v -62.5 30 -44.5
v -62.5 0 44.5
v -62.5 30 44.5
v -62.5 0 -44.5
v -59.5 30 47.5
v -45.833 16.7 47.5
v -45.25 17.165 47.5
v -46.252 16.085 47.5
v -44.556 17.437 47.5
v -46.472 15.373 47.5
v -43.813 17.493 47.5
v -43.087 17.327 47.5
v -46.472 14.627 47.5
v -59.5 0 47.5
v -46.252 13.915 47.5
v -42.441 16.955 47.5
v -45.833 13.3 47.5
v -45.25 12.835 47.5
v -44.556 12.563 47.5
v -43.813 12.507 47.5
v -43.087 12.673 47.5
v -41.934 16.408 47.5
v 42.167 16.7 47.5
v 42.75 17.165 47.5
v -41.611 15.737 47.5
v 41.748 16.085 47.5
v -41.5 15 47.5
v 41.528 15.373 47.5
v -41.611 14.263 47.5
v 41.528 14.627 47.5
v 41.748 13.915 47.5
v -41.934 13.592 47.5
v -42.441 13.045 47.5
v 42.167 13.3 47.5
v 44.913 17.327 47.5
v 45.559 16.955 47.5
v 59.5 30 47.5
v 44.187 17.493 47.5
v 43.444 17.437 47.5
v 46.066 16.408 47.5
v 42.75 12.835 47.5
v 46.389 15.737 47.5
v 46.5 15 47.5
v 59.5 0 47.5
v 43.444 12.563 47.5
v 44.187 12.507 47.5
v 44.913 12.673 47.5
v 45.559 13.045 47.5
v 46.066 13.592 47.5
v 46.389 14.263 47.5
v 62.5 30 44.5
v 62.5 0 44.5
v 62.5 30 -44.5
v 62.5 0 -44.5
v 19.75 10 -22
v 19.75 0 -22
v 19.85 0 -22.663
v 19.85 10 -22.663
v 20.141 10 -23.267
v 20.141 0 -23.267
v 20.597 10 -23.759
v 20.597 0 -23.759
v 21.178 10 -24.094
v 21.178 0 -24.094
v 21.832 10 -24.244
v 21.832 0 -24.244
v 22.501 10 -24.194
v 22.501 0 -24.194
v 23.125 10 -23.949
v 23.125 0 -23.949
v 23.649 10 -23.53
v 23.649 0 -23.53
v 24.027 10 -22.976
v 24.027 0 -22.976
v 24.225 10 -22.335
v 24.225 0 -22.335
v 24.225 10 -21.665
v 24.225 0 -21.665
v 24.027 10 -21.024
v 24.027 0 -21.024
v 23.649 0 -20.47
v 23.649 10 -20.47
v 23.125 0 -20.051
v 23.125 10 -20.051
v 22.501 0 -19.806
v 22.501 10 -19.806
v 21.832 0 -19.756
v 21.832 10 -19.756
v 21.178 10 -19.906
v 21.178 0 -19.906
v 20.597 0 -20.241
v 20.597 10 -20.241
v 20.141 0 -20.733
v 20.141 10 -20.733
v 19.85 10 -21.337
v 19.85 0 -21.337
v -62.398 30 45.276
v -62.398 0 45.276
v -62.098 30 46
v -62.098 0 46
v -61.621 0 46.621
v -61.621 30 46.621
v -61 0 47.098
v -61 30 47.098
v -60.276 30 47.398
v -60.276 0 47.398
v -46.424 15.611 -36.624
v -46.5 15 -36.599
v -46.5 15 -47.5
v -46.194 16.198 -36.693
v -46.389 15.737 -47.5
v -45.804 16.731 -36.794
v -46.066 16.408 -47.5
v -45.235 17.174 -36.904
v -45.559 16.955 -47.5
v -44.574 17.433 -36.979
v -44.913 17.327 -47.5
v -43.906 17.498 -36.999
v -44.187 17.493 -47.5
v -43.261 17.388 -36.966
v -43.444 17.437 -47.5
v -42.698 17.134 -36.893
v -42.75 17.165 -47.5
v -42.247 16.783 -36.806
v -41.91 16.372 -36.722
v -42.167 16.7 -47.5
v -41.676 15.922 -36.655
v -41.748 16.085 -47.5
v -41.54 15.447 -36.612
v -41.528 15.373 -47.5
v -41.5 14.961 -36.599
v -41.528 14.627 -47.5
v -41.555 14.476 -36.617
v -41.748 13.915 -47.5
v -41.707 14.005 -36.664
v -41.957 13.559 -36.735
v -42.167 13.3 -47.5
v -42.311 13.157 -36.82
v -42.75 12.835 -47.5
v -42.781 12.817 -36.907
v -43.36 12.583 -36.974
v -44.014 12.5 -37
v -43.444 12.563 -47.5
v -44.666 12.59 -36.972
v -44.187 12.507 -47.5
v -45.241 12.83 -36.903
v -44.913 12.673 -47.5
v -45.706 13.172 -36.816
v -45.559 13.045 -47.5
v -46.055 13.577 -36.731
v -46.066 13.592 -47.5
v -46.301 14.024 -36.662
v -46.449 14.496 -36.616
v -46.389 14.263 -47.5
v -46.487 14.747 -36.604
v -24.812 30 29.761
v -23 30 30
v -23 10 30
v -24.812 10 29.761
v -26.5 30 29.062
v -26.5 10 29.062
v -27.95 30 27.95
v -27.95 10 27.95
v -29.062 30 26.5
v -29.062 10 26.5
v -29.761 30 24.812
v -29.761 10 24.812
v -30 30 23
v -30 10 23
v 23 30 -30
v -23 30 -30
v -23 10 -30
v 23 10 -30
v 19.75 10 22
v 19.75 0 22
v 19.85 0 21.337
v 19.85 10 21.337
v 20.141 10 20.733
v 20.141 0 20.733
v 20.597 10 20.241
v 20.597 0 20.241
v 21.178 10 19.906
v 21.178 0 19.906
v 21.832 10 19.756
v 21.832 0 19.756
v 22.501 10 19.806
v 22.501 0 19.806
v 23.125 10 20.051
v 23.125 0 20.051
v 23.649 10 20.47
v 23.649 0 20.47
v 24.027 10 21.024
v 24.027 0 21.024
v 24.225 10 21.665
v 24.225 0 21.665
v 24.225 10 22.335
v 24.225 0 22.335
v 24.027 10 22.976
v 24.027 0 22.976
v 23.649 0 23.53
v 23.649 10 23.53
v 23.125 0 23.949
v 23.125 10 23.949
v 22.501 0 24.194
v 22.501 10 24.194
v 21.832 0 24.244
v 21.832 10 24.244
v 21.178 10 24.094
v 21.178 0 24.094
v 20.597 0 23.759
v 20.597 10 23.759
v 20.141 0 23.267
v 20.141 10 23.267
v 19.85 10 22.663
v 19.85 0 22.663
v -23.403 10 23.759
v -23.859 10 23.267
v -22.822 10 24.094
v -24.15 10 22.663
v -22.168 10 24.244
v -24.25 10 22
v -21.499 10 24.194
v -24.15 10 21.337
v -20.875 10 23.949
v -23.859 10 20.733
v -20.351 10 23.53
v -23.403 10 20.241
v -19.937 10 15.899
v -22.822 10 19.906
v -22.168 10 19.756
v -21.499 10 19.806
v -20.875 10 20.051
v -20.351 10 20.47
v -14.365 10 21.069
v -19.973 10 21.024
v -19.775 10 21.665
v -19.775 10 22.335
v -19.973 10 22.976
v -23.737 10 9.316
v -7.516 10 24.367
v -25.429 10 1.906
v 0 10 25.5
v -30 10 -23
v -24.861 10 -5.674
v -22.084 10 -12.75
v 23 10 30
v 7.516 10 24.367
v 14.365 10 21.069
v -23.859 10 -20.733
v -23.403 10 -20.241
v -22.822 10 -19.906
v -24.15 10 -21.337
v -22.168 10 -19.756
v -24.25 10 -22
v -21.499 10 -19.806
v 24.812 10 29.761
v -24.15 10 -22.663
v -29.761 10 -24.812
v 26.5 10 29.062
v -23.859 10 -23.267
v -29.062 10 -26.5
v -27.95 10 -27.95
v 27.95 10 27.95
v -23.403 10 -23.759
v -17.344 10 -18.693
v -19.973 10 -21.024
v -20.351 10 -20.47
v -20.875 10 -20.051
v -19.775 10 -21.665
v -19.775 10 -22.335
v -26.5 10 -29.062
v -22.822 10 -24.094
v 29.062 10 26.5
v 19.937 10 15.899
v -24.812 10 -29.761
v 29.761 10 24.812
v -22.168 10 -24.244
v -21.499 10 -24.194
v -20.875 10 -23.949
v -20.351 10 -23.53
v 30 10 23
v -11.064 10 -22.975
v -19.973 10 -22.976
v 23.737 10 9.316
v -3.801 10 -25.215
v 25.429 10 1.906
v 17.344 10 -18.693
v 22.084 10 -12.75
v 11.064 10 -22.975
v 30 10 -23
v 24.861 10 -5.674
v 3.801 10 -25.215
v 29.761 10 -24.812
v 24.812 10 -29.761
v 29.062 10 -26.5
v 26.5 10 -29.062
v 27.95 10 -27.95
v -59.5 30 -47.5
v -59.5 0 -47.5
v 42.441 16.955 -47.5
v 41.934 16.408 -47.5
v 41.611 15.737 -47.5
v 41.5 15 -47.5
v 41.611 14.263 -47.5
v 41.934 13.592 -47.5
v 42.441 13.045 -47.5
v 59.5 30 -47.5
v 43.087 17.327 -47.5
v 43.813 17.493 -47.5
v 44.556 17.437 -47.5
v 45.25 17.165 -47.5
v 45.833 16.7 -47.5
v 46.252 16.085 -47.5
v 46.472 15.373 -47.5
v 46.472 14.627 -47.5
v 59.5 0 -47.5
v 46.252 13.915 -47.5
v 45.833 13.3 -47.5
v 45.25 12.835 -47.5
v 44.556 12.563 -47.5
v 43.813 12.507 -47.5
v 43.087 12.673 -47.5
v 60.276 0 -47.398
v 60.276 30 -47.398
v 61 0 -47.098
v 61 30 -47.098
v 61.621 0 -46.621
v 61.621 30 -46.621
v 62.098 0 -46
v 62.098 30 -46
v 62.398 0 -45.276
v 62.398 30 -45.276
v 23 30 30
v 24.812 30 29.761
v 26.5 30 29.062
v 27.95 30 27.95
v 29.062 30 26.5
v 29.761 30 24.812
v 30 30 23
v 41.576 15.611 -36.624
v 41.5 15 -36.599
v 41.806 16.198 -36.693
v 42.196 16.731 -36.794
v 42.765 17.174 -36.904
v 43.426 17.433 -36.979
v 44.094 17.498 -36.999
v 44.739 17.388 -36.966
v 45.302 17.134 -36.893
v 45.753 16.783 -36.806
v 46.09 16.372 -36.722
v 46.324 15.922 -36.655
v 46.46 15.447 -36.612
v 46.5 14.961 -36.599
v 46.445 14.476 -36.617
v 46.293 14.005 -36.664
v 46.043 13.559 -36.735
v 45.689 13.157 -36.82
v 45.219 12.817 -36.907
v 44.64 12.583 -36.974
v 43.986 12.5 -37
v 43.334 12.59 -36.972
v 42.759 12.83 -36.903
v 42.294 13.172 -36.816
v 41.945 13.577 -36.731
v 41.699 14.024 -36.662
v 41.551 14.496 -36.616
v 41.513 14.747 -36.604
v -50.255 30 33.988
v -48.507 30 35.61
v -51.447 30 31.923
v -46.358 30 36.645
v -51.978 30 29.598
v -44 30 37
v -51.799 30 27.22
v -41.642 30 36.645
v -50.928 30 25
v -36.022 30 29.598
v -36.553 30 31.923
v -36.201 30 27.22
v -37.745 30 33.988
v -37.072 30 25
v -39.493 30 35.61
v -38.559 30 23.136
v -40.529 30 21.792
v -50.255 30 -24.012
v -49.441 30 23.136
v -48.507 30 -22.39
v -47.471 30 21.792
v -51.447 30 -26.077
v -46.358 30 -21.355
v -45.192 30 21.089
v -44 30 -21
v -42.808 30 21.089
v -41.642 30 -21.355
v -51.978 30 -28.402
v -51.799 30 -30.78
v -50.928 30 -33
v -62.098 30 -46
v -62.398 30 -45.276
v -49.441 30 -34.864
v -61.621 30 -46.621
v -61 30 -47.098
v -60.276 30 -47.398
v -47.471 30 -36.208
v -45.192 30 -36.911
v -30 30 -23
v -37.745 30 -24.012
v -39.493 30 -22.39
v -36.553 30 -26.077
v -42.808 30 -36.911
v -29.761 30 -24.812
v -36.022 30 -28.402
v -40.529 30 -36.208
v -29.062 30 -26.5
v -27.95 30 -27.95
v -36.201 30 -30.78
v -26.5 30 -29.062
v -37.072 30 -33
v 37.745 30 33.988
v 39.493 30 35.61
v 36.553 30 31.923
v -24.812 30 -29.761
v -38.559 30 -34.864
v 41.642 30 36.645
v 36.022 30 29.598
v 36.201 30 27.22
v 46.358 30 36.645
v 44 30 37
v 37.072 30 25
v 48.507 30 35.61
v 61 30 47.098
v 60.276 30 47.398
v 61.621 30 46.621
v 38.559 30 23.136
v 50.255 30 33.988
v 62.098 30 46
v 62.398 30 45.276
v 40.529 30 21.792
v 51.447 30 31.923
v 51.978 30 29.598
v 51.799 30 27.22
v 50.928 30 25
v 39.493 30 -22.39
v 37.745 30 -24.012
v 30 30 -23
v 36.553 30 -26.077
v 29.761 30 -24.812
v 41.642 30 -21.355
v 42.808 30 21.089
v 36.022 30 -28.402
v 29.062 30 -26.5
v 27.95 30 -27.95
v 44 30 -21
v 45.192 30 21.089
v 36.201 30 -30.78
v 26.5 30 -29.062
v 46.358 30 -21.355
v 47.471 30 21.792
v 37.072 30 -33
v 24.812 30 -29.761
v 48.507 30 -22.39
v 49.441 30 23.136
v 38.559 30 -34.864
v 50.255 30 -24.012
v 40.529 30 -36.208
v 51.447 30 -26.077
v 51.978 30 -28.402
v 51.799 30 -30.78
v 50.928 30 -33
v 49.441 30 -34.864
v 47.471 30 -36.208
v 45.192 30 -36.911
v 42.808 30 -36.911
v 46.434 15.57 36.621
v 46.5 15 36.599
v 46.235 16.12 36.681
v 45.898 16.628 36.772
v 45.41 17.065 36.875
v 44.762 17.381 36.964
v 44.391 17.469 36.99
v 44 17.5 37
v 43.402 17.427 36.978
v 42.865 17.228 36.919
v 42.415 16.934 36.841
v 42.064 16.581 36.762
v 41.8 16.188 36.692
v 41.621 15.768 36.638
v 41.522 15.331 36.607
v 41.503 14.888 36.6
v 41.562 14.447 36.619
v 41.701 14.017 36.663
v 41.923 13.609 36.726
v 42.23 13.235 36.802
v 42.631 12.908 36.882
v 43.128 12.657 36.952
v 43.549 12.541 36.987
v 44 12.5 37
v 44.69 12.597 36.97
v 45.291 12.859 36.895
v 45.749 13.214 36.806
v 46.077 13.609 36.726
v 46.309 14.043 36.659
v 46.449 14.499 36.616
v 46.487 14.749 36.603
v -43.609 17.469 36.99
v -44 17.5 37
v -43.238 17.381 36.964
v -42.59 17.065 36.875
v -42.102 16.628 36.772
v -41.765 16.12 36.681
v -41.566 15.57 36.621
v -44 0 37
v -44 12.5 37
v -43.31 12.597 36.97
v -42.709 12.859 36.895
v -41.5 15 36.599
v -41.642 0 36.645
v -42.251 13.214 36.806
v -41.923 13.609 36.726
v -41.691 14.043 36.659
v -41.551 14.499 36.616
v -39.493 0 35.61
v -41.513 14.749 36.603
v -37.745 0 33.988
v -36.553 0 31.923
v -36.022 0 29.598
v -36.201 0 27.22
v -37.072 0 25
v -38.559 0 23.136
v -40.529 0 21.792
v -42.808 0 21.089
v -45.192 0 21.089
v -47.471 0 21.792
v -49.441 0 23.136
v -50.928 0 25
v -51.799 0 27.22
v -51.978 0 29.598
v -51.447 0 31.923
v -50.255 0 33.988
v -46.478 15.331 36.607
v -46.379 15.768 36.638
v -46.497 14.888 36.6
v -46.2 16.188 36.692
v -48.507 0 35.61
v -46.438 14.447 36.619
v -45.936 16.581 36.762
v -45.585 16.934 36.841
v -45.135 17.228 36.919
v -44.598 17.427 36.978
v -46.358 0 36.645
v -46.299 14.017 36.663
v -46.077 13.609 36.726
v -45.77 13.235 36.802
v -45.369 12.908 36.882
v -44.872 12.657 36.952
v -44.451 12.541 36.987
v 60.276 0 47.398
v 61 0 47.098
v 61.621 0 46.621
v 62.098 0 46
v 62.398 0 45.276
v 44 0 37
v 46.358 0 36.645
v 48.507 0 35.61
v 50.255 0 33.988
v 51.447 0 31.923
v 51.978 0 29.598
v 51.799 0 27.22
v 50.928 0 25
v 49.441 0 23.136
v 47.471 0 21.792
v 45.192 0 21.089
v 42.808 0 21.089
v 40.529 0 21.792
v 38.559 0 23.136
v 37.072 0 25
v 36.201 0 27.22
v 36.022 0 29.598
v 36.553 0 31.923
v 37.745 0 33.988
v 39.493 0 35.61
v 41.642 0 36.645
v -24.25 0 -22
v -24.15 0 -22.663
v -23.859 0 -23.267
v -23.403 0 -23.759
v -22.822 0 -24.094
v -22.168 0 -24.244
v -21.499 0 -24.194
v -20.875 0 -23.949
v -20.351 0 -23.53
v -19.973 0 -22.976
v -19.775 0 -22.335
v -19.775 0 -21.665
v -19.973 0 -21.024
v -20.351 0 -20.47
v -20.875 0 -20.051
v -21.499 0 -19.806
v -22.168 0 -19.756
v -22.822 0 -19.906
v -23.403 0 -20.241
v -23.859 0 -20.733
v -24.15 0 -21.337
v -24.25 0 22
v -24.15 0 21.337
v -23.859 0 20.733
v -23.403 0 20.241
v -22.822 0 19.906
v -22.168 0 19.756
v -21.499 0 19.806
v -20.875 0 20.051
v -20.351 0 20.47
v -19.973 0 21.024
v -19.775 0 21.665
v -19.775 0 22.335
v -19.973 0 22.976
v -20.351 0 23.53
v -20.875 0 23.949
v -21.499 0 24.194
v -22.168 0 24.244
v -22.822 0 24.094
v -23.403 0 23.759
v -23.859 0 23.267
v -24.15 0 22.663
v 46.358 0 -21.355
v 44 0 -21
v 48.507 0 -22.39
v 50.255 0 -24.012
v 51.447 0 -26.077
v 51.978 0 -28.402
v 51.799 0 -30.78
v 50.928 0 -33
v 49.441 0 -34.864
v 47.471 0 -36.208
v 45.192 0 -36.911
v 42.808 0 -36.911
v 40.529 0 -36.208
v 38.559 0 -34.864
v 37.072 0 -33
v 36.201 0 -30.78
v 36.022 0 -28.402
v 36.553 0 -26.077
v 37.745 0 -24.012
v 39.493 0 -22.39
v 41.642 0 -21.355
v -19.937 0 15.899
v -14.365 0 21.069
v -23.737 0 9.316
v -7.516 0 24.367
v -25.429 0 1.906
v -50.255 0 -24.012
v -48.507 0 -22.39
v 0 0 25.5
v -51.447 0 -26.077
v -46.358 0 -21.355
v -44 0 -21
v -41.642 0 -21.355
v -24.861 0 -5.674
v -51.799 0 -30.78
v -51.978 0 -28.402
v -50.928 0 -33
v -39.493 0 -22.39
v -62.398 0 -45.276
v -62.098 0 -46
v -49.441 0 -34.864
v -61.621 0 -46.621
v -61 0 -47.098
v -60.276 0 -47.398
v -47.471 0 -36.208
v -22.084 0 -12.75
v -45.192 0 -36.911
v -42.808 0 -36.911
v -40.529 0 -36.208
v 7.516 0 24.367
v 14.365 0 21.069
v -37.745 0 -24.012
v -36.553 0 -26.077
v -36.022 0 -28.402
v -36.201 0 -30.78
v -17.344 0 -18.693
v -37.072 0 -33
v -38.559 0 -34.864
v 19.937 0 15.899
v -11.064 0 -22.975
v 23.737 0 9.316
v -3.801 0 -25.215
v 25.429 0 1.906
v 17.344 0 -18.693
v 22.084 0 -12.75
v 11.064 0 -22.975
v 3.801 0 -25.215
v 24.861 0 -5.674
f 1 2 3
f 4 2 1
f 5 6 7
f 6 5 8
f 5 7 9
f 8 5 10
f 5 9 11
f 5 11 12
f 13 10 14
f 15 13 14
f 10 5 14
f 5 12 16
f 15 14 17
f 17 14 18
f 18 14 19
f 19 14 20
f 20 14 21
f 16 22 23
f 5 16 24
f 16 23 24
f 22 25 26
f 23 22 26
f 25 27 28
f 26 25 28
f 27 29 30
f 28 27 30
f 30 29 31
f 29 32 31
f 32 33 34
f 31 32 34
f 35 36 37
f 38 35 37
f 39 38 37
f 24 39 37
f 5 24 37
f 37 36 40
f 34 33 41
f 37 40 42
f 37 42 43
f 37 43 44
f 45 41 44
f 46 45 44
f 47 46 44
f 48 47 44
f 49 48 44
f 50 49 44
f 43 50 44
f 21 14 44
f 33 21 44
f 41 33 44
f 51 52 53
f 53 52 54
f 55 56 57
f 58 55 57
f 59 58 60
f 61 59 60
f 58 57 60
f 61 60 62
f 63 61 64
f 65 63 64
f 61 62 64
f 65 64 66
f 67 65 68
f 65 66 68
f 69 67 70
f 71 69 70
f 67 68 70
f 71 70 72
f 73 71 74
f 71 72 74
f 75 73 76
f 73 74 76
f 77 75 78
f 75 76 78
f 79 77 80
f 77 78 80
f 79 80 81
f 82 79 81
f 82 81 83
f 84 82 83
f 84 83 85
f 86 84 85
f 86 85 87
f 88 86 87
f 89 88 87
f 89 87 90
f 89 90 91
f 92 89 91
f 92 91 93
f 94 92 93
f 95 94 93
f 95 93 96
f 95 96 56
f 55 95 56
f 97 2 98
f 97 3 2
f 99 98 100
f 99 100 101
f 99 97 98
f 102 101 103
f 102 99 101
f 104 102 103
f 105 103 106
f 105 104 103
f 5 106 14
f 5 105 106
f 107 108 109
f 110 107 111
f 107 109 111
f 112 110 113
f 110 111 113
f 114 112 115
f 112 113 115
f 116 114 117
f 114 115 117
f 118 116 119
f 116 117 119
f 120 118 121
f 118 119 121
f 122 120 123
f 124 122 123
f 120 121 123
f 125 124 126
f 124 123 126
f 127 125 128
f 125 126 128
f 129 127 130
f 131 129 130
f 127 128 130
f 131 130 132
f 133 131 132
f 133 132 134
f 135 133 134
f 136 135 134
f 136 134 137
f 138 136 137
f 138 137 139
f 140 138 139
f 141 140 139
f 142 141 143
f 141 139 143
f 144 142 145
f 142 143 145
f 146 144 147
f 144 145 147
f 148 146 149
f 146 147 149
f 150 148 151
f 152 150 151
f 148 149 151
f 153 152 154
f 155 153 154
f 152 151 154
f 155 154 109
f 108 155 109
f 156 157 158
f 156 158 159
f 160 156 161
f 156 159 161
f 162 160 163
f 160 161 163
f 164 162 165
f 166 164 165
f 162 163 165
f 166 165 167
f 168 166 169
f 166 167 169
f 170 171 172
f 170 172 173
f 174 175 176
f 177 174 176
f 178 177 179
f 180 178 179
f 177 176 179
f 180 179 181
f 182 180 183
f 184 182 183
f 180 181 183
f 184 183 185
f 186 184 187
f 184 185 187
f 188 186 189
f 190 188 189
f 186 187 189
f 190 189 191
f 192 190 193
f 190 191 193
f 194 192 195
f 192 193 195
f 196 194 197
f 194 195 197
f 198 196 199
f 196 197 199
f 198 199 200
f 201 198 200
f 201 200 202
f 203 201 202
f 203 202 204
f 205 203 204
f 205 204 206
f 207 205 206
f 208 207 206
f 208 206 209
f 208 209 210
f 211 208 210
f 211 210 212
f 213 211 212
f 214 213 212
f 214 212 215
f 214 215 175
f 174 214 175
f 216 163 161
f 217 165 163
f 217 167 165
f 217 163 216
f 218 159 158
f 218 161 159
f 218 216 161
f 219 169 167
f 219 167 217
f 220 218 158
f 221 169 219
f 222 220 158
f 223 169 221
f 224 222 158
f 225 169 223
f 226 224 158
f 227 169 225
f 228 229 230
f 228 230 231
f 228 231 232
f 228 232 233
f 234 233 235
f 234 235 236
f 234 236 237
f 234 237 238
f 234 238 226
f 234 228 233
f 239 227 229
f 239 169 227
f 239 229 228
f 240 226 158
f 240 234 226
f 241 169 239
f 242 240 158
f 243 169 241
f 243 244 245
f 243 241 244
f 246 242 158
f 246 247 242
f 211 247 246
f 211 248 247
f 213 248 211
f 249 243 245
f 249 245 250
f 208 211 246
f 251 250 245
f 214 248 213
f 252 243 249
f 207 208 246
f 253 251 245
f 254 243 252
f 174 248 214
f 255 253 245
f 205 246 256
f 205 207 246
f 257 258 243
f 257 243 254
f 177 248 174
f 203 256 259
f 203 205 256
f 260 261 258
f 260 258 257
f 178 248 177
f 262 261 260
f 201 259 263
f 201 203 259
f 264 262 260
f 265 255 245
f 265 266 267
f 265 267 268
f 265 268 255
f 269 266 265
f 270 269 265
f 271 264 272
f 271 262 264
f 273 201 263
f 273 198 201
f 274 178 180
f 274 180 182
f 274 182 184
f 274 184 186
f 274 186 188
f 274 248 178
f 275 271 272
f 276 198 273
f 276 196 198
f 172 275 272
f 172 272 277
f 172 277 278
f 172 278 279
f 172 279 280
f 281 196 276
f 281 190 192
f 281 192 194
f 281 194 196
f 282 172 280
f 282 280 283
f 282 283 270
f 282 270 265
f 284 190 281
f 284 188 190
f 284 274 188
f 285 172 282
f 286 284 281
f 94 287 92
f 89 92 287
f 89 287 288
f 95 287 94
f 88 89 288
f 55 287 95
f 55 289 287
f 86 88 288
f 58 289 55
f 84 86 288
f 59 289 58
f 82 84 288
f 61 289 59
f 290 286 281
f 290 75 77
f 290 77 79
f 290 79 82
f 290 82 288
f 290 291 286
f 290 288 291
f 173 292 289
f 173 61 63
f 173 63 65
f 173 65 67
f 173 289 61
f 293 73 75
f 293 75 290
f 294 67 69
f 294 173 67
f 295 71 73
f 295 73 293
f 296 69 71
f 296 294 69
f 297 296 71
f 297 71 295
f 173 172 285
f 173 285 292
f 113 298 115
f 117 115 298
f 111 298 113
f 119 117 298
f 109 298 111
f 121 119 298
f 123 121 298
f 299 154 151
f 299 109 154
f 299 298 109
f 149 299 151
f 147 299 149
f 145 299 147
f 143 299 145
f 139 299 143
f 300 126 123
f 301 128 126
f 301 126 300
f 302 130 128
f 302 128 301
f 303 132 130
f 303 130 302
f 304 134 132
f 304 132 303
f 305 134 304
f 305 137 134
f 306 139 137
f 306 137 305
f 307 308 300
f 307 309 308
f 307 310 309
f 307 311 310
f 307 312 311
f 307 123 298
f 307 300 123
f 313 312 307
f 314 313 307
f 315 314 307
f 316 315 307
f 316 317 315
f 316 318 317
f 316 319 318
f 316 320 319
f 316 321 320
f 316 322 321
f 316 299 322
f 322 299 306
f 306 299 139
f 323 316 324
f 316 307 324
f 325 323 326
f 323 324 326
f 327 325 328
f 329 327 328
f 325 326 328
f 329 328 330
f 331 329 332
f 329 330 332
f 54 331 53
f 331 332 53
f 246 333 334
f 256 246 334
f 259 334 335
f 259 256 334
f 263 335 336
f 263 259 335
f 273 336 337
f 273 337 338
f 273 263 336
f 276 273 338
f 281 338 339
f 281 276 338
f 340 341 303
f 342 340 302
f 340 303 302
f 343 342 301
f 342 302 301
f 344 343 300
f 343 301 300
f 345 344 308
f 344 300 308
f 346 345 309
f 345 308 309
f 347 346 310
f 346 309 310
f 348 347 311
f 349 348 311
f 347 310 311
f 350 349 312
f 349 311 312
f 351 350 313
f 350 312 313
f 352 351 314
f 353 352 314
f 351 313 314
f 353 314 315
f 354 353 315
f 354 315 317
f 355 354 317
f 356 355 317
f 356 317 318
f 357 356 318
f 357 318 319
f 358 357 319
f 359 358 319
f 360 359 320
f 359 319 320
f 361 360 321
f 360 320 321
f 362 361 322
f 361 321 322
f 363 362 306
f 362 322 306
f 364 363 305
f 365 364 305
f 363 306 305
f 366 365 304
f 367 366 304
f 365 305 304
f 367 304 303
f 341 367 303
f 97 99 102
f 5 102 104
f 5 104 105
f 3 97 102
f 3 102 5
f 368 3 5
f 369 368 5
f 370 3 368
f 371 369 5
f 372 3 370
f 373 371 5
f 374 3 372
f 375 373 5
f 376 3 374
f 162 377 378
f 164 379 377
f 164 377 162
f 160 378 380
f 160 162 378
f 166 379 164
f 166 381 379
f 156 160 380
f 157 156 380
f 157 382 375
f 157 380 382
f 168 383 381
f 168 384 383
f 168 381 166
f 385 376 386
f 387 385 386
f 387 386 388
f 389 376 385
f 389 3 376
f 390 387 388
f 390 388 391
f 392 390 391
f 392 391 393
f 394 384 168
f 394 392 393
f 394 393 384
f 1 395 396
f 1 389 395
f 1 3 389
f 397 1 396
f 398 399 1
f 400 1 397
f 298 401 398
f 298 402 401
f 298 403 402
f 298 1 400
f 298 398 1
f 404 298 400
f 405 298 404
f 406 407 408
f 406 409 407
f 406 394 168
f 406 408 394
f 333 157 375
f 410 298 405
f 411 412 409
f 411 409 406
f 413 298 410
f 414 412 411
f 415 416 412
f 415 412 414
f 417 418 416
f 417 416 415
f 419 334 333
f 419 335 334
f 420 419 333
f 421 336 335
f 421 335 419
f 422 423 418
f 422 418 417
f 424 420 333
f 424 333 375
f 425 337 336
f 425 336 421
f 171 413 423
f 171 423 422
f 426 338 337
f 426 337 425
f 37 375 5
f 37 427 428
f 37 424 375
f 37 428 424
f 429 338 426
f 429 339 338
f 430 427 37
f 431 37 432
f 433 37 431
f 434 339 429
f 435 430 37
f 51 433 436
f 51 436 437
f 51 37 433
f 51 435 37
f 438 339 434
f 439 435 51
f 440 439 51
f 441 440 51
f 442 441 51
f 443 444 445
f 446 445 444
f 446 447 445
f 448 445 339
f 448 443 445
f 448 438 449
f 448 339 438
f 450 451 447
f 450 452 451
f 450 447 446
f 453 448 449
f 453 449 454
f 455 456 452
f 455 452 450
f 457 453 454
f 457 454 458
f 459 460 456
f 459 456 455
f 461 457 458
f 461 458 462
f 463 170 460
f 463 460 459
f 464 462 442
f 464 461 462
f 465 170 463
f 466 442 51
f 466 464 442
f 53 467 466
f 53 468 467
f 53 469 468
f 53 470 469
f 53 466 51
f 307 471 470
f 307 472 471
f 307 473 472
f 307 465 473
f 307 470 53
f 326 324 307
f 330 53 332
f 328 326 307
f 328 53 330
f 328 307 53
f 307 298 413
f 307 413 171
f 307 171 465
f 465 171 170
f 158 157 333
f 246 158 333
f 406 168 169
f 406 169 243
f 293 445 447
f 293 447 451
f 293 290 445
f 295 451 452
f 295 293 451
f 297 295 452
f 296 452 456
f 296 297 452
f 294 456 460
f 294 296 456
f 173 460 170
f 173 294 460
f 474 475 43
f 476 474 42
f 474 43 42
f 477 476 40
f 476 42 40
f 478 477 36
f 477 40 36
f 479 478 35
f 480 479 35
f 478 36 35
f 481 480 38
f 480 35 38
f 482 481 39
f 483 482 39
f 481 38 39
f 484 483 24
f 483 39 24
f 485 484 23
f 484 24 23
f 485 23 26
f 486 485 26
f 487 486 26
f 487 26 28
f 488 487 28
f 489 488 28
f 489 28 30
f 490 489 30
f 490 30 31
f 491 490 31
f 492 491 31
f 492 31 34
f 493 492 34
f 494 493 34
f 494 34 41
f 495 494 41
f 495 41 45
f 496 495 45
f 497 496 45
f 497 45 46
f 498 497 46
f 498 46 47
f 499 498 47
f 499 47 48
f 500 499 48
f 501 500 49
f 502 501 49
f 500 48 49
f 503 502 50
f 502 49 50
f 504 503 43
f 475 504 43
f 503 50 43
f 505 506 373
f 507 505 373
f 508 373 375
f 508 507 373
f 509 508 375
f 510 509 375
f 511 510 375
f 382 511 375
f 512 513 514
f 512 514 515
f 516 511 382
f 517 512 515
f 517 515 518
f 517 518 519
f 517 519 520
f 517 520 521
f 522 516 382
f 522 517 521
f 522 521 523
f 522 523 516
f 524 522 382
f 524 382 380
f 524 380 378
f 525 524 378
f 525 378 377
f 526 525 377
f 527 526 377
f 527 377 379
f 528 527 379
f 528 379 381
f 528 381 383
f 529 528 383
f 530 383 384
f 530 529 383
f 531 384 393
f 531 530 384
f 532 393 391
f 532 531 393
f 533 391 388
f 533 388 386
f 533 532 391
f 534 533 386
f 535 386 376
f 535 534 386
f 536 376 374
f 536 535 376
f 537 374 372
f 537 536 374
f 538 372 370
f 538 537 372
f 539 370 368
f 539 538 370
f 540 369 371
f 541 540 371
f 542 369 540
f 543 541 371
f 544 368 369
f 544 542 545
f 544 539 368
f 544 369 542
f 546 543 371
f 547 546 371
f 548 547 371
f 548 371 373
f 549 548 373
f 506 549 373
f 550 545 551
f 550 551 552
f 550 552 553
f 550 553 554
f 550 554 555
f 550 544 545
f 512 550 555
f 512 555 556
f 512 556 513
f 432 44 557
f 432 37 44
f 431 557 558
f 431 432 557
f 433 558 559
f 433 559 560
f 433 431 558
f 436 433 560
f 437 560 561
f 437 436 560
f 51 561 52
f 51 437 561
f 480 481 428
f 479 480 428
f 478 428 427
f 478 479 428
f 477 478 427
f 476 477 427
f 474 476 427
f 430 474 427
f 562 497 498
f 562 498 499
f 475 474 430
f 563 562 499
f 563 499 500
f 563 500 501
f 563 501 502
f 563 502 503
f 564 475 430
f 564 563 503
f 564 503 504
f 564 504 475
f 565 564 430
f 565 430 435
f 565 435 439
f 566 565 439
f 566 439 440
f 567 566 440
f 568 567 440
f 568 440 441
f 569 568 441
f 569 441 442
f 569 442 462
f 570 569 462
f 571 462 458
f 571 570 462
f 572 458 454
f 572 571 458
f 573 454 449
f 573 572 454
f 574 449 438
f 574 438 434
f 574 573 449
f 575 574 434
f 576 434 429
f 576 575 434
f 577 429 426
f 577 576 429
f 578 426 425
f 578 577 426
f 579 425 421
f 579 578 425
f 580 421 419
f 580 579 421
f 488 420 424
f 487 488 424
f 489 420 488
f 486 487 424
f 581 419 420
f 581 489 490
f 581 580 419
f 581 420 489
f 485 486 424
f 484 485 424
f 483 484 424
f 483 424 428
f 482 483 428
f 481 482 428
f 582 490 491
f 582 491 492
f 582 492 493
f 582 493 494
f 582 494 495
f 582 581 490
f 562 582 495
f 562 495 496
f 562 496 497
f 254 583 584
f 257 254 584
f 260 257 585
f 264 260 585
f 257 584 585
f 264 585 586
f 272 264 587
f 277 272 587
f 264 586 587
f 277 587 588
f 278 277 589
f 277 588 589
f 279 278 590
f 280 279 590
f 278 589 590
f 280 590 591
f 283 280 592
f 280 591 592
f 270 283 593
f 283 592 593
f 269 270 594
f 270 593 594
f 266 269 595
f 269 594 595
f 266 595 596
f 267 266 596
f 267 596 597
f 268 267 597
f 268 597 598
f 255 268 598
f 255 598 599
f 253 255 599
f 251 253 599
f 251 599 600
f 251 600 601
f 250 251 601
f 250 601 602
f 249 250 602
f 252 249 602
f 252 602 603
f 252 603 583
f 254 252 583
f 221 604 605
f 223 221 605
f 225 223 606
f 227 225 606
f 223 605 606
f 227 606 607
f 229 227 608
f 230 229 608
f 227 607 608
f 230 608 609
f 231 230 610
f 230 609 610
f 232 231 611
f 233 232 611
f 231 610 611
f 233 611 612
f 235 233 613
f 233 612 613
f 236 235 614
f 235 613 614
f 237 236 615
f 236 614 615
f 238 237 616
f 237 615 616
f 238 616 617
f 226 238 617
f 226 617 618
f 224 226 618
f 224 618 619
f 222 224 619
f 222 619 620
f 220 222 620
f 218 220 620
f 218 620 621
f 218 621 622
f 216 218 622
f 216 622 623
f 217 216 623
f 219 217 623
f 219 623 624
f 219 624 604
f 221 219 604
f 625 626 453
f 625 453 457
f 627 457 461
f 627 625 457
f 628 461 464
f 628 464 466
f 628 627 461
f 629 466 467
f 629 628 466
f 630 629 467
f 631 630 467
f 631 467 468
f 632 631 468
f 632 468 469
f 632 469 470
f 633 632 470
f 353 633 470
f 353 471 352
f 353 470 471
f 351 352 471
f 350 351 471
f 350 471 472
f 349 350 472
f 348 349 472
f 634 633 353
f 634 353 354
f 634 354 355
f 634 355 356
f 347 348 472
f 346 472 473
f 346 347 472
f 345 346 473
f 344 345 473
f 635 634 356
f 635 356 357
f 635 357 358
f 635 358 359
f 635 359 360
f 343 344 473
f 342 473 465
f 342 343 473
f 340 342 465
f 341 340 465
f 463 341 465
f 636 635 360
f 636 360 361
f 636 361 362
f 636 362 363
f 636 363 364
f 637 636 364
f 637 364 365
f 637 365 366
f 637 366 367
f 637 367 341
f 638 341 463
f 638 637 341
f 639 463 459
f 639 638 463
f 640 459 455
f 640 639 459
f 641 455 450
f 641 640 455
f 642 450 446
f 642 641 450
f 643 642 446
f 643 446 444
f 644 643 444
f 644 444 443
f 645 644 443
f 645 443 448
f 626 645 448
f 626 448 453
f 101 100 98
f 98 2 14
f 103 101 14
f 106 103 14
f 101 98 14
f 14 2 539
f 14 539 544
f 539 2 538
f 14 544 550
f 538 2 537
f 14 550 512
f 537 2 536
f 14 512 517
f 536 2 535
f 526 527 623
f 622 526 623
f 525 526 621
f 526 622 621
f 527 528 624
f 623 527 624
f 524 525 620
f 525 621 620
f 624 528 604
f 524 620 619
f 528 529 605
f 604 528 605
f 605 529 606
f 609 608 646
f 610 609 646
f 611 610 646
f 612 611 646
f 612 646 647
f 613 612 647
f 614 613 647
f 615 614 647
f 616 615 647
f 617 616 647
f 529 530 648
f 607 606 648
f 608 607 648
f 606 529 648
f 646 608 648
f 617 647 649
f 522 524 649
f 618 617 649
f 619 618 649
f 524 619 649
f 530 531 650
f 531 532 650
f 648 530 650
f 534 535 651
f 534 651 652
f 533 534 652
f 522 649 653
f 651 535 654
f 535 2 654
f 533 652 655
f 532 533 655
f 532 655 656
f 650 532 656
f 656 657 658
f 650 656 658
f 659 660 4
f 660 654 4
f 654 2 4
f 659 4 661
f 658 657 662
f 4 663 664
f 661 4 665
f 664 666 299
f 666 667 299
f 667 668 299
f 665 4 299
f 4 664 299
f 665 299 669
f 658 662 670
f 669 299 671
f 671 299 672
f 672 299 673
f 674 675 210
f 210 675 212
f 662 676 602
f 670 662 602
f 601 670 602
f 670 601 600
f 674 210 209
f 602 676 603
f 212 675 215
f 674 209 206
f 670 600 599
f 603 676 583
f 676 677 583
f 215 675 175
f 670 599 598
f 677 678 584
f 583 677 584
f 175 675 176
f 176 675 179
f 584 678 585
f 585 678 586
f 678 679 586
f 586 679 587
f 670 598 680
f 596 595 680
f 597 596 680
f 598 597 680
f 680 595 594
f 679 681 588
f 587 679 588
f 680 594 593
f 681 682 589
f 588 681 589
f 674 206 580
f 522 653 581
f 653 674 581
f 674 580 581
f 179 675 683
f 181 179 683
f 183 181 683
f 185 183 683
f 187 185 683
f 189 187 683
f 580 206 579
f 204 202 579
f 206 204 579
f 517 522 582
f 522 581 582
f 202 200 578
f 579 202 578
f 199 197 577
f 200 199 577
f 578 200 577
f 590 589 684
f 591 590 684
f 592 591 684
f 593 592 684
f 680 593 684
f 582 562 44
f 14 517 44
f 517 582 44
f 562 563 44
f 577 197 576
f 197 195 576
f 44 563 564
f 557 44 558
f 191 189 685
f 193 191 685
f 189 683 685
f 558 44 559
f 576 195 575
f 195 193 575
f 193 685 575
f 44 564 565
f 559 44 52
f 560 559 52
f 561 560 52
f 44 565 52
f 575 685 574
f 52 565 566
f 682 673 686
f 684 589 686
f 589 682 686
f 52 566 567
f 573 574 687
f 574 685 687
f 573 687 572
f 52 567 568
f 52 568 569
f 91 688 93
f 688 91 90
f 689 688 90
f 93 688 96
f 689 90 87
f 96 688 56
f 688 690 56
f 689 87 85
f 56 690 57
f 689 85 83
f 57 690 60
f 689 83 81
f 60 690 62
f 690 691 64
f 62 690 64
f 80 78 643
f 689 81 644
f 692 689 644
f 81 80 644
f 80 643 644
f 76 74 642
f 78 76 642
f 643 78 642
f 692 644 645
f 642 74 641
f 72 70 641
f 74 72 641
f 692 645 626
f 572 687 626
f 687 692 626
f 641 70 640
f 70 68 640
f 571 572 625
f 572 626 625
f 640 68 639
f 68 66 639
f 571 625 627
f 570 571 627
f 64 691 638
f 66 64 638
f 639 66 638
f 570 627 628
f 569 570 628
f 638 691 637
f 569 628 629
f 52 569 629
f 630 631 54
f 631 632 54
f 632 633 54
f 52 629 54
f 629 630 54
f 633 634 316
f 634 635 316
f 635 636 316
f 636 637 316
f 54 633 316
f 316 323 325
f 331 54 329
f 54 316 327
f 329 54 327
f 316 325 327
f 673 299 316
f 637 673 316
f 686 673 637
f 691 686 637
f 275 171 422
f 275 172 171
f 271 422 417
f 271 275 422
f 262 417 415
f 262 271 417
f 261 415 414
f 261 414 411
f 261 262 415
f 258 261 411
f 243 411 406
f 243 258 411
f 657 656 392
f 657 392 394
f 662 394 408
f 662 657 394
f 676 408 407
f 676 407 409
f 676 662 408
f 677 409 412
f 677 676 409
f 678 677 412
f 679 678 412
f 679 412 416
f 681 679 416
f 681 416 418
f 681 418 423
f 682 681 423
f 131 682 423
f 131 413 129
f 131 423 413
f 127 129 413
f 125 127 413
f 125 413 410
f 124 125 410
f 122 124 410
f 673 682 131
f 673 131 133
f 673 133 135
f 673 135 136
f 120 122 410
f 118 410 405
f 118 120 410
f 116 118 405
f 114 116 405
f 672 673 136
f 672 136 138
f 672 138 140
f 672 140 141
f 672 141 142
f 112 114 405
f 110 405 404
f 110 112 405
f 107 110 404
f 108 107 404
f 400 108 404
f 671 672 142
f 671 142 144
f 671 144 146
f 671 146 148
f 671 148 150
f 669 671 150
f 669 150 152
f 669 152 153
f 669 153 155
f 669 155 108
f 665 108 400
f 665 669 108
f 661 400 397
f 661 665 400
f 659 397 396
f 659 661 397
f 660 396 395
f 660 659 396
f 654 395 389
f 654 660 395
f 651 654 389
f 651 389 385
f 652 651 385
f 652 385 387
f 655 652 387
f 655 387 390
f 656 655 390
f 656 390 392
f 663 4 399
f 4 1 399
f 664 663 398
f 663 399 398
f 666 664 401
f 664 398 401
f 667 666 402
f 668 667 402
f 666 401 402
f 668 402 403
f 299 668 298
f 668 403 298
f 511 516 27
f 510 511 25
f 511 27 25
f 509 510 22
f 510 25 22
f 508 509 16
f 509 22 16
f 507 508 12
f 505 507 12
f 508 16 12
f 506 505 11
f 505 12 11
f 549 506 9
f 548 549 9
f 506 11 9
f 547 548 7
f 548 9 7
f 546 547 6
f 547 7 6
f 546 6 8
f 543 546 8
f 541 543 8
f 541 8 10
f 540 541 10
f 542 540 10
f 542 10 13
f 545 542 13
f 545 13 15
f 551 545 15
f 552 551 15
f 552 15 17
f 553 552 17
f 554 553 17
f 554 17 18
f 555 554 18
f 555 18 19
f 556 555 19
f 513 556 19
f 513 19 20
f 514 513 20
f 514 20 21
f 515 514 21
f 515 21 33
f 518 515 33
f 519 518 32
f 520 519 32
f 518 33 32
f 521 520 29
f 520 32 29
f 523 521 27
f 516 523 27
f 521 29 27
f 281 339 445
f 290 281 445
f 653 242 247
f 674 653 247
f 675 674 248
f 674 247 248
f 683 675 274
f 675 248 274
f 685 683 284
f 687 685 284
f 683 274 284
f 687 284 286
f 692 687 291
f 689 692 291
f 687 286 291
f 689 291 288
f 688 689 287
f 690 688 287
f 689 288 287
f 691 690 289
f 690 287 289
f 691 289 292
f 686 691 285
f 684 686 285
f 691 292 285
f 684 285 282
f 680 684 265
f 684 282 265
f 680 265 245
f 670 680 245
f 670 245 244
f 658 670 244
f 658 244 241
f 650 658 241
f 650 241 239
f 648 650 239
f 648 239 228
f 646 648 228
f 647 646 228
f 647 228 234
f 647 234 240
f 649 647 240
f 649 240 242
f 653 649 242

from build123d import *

# Parameters (mm, degrees)
SKETCH2_W                  = 125
SKETCH2_H                  = 95
SKETCH2_R                  = 8
BOSS_EXTRUDE1_DEPTH        = 30
SKETCH3_W                  = 60
SKETCH3_H                  = 60
CUT_EXTRUDE1_DEPTH         = 20
SKETCH4_R                  = 25.5
CUT_EXTRUDE2_DEPTH         = 82.00925873
FILLET1_R                  = 7
FILLET3_R                  = 3
M4_CLEARANCE_HOLE1_D       = 4.5
M6X1_0_TAPPED_HOLE1_REACH  = 119.606
M6X1_0_TAPPED_HOLE1_BORE_R = 2.5
M6X1_0_TAPPED_HOLE2_REACH  = 119.606
M6X1_0_TAPPED_HOLE2_BORE_R = 2.5


with BuildPart() as part:
    # Sketch2 → Boss-Extrude1 (new body)
    with BuildSketch(Plane(origin=(0, 0, 0), x_dir=(1, 0, 0), z_dir=(0, 1, 0))):
        Rectangle(SKETCH2_W, SKETCH2_H)
        with Locations(Location((-44, 29, 0), (0, 0, 270))):
            Circle(SKETCH2_R, mode=Mode.SUBTRACT)
        with Locations(Location((-44, -29, 0), (0, 0, 270))):
            Circle(SKETCH2_R, mode=Mode.SUBTRACT)
        with Locations(Location((44, -29, 0), (0, 0, 270))):
            Circle(SKETCH2_R, mode=Mode.SUBTRACT)
        with Locations(Location((44, 29, 0), (0, 0, 270))):
            Circle(SKETCH2_R, mode=Mode.SUBTRACT)
    extrude(amount=BOSS_EXTRUDE1_DEPTH)

    # Sketch3 → Cut-Extrude1 (cut)
    with BuildSketch(Plane(origin=(0, 30, 0), x_dir=(1, 0, 0), z_dir=(0, 1, 0))):
        Rectangle(SKETCH3_W, SKETCH3_H)
    extrude(amount=-CUT_EXTRUDE1_DEPTH, mode=Mode.SUBTRACT)

    # Sketch4 → Cut-Extrude2 (cut, through all)
    with BuildSketch(Plane(origin=(0, 10, 0), x_dir=(1, 0, 0), z_dir=(0, 1, 0))):
        with Locations(Location((0, 0, 0), (0, 0, 270))):
            Circle(SKETCH4_R)
    extrude(amount=-CUT_EXTRUDE2_DEPTH, mode=Mode.SUBTRACT)

    # Fillet1
    fillet1_edges = [part.edges().sort_by_distance(p)[0] for p in [
        (30, 20, -30),
        (30, 20, 30),
        (-30, 20, 30),
        (-30, 20, -30),
    ]]
    fillet(fillet1_edges, radius=FILLET1_R)

    # Fillet3
    fillet3_edges = [part.edges().sort_by_distance(p)[0] for p in [
        (-62.5, 15, -47.5),
        (62.5, 15, -47.5),
        (62.5, 15, 47.5),
        (-62.5, 15, 47.5),
    ]]
    fillet(fillet3_edges, radius=FILLET3_R)

    # M4 Clearance Hole1 (through all)
    with Locations(Plane(origin=(0, 30, 0), x_dir=(1, 0, 0), z_dir=(0, 1, 0))):
        with Locations((-22, 22), (22, 22), (22, -22), (-22, -22)):
            Hole(M4_CLEARANCE_HOLE1_D / 2)

    # M6x1.0 Tapped Hole1 bore → M6x1.0 Tapped Hole1 (cut, up to next)
    with BuildSketch(Plane.XY.offset(47.5), mode=Mode.PRIVATE) as m6x1_0_tapped_hole1_sk1:
        with Locations((-44, 15)):
            Circle(M6X1_0_TAPPED_HOLE1_BORE_R)
    m6x1_0_tapped_hole1_tool1 = extrude(m6x1_0_tapped_hole1_sk1.sketch, amount=-M6X1_0_TAPPED_HOLE1_REACH, mode=Mode.PRIVATE) & part.part
    # M6x1.0 Tapped Hole1 bore → M6x1.0 Tapped Hole1 (cut, up to next)
    with BuildSketch(Plane.XY.offset(47.5), mode=Mode.PRIVATE) as m6x1_0_tapped_hole1_sk2:
        with Locations((44, 15)):
            Circle(M6X1_0_TAPPED_HOLE1_BORE_R)
    m6x1_0_tapped_hole1_tool2 = extrude(m6x1_0_tapped_hole1_sk2.sketch, amount=-M6X1_0_TAPPED_HOLE1_REACH, mode=Mode.PRIVATE) & part.part
    add(m6x1_0_tapped_hole1_tool1.solids().sort_by_distance((-44, 15, 47.5))[0], mode=Mode.SUBTRACT)
    add(m6x1_0_tapped_hole1_tool2.solids().sort_by_distance((44, 15, 47.5))[0], mode=Mode.SUBTRACT)

    # M6x1.0 Tapped Hole2 bore → M6x1.0 Tapped Hole2 (cut, up to next)
    with BuildSketch(Plane(origin=(0, 0, -47.5), x_dir=(-1, 0, 0), z_dir=(0, 0, -1)), mode=Mode.PRIVATE) as m6x1_0_tapped_hole2_sk1:
        with Locations((-44, 15)):
            Circle(M6X1_0_TAPPED_HOLE2_BORE_R)
    m6x1_0_tapped_hole2_tool1 = extrude(m6x1_0_tapped_hole2_sk1.sketch, amount=-M6X1_0_TAPPED_HOLE2_REACH, mode=Mode.PRIVATE) & part.part
    # M6x1.0 Tapped Hole2 bore → M6x1.0 Tapped Hole2 (cut, up to next)
    with BuildSketch(Plane(origin=(0, 0, -47.5), x_dir=(-1, 0, 0), z_dir=(0, 0, -1)), mode=Mode.PRIVATE) as m6x1_0_tapped_hole2_sk2:
        with Locations((44, 15)):
            Circle(M6X1_0_TAPPED_HOLE2_BORE_R)
    m6x1_0_tapped_hole2_tool2 = extrude(m6x1_0_tapped_hole2_sk2.sketch, amount=-M6X1_0_TAPPED_HOLE2_REACH, mode=Mode.PRIVATE) & part.part
    add(m6x1_0_tapped_hole2_tool1.solids().sort_by_distance((44, 15, -47.5))[0], mode=Mode.SUBTRACT)
    add(m6x1_0_tapped_hole2_tool2.solids().sort_by_distance((-44, 15, -47.5))[0], mode=Mode.SUBTRACT)


solid = part.part
